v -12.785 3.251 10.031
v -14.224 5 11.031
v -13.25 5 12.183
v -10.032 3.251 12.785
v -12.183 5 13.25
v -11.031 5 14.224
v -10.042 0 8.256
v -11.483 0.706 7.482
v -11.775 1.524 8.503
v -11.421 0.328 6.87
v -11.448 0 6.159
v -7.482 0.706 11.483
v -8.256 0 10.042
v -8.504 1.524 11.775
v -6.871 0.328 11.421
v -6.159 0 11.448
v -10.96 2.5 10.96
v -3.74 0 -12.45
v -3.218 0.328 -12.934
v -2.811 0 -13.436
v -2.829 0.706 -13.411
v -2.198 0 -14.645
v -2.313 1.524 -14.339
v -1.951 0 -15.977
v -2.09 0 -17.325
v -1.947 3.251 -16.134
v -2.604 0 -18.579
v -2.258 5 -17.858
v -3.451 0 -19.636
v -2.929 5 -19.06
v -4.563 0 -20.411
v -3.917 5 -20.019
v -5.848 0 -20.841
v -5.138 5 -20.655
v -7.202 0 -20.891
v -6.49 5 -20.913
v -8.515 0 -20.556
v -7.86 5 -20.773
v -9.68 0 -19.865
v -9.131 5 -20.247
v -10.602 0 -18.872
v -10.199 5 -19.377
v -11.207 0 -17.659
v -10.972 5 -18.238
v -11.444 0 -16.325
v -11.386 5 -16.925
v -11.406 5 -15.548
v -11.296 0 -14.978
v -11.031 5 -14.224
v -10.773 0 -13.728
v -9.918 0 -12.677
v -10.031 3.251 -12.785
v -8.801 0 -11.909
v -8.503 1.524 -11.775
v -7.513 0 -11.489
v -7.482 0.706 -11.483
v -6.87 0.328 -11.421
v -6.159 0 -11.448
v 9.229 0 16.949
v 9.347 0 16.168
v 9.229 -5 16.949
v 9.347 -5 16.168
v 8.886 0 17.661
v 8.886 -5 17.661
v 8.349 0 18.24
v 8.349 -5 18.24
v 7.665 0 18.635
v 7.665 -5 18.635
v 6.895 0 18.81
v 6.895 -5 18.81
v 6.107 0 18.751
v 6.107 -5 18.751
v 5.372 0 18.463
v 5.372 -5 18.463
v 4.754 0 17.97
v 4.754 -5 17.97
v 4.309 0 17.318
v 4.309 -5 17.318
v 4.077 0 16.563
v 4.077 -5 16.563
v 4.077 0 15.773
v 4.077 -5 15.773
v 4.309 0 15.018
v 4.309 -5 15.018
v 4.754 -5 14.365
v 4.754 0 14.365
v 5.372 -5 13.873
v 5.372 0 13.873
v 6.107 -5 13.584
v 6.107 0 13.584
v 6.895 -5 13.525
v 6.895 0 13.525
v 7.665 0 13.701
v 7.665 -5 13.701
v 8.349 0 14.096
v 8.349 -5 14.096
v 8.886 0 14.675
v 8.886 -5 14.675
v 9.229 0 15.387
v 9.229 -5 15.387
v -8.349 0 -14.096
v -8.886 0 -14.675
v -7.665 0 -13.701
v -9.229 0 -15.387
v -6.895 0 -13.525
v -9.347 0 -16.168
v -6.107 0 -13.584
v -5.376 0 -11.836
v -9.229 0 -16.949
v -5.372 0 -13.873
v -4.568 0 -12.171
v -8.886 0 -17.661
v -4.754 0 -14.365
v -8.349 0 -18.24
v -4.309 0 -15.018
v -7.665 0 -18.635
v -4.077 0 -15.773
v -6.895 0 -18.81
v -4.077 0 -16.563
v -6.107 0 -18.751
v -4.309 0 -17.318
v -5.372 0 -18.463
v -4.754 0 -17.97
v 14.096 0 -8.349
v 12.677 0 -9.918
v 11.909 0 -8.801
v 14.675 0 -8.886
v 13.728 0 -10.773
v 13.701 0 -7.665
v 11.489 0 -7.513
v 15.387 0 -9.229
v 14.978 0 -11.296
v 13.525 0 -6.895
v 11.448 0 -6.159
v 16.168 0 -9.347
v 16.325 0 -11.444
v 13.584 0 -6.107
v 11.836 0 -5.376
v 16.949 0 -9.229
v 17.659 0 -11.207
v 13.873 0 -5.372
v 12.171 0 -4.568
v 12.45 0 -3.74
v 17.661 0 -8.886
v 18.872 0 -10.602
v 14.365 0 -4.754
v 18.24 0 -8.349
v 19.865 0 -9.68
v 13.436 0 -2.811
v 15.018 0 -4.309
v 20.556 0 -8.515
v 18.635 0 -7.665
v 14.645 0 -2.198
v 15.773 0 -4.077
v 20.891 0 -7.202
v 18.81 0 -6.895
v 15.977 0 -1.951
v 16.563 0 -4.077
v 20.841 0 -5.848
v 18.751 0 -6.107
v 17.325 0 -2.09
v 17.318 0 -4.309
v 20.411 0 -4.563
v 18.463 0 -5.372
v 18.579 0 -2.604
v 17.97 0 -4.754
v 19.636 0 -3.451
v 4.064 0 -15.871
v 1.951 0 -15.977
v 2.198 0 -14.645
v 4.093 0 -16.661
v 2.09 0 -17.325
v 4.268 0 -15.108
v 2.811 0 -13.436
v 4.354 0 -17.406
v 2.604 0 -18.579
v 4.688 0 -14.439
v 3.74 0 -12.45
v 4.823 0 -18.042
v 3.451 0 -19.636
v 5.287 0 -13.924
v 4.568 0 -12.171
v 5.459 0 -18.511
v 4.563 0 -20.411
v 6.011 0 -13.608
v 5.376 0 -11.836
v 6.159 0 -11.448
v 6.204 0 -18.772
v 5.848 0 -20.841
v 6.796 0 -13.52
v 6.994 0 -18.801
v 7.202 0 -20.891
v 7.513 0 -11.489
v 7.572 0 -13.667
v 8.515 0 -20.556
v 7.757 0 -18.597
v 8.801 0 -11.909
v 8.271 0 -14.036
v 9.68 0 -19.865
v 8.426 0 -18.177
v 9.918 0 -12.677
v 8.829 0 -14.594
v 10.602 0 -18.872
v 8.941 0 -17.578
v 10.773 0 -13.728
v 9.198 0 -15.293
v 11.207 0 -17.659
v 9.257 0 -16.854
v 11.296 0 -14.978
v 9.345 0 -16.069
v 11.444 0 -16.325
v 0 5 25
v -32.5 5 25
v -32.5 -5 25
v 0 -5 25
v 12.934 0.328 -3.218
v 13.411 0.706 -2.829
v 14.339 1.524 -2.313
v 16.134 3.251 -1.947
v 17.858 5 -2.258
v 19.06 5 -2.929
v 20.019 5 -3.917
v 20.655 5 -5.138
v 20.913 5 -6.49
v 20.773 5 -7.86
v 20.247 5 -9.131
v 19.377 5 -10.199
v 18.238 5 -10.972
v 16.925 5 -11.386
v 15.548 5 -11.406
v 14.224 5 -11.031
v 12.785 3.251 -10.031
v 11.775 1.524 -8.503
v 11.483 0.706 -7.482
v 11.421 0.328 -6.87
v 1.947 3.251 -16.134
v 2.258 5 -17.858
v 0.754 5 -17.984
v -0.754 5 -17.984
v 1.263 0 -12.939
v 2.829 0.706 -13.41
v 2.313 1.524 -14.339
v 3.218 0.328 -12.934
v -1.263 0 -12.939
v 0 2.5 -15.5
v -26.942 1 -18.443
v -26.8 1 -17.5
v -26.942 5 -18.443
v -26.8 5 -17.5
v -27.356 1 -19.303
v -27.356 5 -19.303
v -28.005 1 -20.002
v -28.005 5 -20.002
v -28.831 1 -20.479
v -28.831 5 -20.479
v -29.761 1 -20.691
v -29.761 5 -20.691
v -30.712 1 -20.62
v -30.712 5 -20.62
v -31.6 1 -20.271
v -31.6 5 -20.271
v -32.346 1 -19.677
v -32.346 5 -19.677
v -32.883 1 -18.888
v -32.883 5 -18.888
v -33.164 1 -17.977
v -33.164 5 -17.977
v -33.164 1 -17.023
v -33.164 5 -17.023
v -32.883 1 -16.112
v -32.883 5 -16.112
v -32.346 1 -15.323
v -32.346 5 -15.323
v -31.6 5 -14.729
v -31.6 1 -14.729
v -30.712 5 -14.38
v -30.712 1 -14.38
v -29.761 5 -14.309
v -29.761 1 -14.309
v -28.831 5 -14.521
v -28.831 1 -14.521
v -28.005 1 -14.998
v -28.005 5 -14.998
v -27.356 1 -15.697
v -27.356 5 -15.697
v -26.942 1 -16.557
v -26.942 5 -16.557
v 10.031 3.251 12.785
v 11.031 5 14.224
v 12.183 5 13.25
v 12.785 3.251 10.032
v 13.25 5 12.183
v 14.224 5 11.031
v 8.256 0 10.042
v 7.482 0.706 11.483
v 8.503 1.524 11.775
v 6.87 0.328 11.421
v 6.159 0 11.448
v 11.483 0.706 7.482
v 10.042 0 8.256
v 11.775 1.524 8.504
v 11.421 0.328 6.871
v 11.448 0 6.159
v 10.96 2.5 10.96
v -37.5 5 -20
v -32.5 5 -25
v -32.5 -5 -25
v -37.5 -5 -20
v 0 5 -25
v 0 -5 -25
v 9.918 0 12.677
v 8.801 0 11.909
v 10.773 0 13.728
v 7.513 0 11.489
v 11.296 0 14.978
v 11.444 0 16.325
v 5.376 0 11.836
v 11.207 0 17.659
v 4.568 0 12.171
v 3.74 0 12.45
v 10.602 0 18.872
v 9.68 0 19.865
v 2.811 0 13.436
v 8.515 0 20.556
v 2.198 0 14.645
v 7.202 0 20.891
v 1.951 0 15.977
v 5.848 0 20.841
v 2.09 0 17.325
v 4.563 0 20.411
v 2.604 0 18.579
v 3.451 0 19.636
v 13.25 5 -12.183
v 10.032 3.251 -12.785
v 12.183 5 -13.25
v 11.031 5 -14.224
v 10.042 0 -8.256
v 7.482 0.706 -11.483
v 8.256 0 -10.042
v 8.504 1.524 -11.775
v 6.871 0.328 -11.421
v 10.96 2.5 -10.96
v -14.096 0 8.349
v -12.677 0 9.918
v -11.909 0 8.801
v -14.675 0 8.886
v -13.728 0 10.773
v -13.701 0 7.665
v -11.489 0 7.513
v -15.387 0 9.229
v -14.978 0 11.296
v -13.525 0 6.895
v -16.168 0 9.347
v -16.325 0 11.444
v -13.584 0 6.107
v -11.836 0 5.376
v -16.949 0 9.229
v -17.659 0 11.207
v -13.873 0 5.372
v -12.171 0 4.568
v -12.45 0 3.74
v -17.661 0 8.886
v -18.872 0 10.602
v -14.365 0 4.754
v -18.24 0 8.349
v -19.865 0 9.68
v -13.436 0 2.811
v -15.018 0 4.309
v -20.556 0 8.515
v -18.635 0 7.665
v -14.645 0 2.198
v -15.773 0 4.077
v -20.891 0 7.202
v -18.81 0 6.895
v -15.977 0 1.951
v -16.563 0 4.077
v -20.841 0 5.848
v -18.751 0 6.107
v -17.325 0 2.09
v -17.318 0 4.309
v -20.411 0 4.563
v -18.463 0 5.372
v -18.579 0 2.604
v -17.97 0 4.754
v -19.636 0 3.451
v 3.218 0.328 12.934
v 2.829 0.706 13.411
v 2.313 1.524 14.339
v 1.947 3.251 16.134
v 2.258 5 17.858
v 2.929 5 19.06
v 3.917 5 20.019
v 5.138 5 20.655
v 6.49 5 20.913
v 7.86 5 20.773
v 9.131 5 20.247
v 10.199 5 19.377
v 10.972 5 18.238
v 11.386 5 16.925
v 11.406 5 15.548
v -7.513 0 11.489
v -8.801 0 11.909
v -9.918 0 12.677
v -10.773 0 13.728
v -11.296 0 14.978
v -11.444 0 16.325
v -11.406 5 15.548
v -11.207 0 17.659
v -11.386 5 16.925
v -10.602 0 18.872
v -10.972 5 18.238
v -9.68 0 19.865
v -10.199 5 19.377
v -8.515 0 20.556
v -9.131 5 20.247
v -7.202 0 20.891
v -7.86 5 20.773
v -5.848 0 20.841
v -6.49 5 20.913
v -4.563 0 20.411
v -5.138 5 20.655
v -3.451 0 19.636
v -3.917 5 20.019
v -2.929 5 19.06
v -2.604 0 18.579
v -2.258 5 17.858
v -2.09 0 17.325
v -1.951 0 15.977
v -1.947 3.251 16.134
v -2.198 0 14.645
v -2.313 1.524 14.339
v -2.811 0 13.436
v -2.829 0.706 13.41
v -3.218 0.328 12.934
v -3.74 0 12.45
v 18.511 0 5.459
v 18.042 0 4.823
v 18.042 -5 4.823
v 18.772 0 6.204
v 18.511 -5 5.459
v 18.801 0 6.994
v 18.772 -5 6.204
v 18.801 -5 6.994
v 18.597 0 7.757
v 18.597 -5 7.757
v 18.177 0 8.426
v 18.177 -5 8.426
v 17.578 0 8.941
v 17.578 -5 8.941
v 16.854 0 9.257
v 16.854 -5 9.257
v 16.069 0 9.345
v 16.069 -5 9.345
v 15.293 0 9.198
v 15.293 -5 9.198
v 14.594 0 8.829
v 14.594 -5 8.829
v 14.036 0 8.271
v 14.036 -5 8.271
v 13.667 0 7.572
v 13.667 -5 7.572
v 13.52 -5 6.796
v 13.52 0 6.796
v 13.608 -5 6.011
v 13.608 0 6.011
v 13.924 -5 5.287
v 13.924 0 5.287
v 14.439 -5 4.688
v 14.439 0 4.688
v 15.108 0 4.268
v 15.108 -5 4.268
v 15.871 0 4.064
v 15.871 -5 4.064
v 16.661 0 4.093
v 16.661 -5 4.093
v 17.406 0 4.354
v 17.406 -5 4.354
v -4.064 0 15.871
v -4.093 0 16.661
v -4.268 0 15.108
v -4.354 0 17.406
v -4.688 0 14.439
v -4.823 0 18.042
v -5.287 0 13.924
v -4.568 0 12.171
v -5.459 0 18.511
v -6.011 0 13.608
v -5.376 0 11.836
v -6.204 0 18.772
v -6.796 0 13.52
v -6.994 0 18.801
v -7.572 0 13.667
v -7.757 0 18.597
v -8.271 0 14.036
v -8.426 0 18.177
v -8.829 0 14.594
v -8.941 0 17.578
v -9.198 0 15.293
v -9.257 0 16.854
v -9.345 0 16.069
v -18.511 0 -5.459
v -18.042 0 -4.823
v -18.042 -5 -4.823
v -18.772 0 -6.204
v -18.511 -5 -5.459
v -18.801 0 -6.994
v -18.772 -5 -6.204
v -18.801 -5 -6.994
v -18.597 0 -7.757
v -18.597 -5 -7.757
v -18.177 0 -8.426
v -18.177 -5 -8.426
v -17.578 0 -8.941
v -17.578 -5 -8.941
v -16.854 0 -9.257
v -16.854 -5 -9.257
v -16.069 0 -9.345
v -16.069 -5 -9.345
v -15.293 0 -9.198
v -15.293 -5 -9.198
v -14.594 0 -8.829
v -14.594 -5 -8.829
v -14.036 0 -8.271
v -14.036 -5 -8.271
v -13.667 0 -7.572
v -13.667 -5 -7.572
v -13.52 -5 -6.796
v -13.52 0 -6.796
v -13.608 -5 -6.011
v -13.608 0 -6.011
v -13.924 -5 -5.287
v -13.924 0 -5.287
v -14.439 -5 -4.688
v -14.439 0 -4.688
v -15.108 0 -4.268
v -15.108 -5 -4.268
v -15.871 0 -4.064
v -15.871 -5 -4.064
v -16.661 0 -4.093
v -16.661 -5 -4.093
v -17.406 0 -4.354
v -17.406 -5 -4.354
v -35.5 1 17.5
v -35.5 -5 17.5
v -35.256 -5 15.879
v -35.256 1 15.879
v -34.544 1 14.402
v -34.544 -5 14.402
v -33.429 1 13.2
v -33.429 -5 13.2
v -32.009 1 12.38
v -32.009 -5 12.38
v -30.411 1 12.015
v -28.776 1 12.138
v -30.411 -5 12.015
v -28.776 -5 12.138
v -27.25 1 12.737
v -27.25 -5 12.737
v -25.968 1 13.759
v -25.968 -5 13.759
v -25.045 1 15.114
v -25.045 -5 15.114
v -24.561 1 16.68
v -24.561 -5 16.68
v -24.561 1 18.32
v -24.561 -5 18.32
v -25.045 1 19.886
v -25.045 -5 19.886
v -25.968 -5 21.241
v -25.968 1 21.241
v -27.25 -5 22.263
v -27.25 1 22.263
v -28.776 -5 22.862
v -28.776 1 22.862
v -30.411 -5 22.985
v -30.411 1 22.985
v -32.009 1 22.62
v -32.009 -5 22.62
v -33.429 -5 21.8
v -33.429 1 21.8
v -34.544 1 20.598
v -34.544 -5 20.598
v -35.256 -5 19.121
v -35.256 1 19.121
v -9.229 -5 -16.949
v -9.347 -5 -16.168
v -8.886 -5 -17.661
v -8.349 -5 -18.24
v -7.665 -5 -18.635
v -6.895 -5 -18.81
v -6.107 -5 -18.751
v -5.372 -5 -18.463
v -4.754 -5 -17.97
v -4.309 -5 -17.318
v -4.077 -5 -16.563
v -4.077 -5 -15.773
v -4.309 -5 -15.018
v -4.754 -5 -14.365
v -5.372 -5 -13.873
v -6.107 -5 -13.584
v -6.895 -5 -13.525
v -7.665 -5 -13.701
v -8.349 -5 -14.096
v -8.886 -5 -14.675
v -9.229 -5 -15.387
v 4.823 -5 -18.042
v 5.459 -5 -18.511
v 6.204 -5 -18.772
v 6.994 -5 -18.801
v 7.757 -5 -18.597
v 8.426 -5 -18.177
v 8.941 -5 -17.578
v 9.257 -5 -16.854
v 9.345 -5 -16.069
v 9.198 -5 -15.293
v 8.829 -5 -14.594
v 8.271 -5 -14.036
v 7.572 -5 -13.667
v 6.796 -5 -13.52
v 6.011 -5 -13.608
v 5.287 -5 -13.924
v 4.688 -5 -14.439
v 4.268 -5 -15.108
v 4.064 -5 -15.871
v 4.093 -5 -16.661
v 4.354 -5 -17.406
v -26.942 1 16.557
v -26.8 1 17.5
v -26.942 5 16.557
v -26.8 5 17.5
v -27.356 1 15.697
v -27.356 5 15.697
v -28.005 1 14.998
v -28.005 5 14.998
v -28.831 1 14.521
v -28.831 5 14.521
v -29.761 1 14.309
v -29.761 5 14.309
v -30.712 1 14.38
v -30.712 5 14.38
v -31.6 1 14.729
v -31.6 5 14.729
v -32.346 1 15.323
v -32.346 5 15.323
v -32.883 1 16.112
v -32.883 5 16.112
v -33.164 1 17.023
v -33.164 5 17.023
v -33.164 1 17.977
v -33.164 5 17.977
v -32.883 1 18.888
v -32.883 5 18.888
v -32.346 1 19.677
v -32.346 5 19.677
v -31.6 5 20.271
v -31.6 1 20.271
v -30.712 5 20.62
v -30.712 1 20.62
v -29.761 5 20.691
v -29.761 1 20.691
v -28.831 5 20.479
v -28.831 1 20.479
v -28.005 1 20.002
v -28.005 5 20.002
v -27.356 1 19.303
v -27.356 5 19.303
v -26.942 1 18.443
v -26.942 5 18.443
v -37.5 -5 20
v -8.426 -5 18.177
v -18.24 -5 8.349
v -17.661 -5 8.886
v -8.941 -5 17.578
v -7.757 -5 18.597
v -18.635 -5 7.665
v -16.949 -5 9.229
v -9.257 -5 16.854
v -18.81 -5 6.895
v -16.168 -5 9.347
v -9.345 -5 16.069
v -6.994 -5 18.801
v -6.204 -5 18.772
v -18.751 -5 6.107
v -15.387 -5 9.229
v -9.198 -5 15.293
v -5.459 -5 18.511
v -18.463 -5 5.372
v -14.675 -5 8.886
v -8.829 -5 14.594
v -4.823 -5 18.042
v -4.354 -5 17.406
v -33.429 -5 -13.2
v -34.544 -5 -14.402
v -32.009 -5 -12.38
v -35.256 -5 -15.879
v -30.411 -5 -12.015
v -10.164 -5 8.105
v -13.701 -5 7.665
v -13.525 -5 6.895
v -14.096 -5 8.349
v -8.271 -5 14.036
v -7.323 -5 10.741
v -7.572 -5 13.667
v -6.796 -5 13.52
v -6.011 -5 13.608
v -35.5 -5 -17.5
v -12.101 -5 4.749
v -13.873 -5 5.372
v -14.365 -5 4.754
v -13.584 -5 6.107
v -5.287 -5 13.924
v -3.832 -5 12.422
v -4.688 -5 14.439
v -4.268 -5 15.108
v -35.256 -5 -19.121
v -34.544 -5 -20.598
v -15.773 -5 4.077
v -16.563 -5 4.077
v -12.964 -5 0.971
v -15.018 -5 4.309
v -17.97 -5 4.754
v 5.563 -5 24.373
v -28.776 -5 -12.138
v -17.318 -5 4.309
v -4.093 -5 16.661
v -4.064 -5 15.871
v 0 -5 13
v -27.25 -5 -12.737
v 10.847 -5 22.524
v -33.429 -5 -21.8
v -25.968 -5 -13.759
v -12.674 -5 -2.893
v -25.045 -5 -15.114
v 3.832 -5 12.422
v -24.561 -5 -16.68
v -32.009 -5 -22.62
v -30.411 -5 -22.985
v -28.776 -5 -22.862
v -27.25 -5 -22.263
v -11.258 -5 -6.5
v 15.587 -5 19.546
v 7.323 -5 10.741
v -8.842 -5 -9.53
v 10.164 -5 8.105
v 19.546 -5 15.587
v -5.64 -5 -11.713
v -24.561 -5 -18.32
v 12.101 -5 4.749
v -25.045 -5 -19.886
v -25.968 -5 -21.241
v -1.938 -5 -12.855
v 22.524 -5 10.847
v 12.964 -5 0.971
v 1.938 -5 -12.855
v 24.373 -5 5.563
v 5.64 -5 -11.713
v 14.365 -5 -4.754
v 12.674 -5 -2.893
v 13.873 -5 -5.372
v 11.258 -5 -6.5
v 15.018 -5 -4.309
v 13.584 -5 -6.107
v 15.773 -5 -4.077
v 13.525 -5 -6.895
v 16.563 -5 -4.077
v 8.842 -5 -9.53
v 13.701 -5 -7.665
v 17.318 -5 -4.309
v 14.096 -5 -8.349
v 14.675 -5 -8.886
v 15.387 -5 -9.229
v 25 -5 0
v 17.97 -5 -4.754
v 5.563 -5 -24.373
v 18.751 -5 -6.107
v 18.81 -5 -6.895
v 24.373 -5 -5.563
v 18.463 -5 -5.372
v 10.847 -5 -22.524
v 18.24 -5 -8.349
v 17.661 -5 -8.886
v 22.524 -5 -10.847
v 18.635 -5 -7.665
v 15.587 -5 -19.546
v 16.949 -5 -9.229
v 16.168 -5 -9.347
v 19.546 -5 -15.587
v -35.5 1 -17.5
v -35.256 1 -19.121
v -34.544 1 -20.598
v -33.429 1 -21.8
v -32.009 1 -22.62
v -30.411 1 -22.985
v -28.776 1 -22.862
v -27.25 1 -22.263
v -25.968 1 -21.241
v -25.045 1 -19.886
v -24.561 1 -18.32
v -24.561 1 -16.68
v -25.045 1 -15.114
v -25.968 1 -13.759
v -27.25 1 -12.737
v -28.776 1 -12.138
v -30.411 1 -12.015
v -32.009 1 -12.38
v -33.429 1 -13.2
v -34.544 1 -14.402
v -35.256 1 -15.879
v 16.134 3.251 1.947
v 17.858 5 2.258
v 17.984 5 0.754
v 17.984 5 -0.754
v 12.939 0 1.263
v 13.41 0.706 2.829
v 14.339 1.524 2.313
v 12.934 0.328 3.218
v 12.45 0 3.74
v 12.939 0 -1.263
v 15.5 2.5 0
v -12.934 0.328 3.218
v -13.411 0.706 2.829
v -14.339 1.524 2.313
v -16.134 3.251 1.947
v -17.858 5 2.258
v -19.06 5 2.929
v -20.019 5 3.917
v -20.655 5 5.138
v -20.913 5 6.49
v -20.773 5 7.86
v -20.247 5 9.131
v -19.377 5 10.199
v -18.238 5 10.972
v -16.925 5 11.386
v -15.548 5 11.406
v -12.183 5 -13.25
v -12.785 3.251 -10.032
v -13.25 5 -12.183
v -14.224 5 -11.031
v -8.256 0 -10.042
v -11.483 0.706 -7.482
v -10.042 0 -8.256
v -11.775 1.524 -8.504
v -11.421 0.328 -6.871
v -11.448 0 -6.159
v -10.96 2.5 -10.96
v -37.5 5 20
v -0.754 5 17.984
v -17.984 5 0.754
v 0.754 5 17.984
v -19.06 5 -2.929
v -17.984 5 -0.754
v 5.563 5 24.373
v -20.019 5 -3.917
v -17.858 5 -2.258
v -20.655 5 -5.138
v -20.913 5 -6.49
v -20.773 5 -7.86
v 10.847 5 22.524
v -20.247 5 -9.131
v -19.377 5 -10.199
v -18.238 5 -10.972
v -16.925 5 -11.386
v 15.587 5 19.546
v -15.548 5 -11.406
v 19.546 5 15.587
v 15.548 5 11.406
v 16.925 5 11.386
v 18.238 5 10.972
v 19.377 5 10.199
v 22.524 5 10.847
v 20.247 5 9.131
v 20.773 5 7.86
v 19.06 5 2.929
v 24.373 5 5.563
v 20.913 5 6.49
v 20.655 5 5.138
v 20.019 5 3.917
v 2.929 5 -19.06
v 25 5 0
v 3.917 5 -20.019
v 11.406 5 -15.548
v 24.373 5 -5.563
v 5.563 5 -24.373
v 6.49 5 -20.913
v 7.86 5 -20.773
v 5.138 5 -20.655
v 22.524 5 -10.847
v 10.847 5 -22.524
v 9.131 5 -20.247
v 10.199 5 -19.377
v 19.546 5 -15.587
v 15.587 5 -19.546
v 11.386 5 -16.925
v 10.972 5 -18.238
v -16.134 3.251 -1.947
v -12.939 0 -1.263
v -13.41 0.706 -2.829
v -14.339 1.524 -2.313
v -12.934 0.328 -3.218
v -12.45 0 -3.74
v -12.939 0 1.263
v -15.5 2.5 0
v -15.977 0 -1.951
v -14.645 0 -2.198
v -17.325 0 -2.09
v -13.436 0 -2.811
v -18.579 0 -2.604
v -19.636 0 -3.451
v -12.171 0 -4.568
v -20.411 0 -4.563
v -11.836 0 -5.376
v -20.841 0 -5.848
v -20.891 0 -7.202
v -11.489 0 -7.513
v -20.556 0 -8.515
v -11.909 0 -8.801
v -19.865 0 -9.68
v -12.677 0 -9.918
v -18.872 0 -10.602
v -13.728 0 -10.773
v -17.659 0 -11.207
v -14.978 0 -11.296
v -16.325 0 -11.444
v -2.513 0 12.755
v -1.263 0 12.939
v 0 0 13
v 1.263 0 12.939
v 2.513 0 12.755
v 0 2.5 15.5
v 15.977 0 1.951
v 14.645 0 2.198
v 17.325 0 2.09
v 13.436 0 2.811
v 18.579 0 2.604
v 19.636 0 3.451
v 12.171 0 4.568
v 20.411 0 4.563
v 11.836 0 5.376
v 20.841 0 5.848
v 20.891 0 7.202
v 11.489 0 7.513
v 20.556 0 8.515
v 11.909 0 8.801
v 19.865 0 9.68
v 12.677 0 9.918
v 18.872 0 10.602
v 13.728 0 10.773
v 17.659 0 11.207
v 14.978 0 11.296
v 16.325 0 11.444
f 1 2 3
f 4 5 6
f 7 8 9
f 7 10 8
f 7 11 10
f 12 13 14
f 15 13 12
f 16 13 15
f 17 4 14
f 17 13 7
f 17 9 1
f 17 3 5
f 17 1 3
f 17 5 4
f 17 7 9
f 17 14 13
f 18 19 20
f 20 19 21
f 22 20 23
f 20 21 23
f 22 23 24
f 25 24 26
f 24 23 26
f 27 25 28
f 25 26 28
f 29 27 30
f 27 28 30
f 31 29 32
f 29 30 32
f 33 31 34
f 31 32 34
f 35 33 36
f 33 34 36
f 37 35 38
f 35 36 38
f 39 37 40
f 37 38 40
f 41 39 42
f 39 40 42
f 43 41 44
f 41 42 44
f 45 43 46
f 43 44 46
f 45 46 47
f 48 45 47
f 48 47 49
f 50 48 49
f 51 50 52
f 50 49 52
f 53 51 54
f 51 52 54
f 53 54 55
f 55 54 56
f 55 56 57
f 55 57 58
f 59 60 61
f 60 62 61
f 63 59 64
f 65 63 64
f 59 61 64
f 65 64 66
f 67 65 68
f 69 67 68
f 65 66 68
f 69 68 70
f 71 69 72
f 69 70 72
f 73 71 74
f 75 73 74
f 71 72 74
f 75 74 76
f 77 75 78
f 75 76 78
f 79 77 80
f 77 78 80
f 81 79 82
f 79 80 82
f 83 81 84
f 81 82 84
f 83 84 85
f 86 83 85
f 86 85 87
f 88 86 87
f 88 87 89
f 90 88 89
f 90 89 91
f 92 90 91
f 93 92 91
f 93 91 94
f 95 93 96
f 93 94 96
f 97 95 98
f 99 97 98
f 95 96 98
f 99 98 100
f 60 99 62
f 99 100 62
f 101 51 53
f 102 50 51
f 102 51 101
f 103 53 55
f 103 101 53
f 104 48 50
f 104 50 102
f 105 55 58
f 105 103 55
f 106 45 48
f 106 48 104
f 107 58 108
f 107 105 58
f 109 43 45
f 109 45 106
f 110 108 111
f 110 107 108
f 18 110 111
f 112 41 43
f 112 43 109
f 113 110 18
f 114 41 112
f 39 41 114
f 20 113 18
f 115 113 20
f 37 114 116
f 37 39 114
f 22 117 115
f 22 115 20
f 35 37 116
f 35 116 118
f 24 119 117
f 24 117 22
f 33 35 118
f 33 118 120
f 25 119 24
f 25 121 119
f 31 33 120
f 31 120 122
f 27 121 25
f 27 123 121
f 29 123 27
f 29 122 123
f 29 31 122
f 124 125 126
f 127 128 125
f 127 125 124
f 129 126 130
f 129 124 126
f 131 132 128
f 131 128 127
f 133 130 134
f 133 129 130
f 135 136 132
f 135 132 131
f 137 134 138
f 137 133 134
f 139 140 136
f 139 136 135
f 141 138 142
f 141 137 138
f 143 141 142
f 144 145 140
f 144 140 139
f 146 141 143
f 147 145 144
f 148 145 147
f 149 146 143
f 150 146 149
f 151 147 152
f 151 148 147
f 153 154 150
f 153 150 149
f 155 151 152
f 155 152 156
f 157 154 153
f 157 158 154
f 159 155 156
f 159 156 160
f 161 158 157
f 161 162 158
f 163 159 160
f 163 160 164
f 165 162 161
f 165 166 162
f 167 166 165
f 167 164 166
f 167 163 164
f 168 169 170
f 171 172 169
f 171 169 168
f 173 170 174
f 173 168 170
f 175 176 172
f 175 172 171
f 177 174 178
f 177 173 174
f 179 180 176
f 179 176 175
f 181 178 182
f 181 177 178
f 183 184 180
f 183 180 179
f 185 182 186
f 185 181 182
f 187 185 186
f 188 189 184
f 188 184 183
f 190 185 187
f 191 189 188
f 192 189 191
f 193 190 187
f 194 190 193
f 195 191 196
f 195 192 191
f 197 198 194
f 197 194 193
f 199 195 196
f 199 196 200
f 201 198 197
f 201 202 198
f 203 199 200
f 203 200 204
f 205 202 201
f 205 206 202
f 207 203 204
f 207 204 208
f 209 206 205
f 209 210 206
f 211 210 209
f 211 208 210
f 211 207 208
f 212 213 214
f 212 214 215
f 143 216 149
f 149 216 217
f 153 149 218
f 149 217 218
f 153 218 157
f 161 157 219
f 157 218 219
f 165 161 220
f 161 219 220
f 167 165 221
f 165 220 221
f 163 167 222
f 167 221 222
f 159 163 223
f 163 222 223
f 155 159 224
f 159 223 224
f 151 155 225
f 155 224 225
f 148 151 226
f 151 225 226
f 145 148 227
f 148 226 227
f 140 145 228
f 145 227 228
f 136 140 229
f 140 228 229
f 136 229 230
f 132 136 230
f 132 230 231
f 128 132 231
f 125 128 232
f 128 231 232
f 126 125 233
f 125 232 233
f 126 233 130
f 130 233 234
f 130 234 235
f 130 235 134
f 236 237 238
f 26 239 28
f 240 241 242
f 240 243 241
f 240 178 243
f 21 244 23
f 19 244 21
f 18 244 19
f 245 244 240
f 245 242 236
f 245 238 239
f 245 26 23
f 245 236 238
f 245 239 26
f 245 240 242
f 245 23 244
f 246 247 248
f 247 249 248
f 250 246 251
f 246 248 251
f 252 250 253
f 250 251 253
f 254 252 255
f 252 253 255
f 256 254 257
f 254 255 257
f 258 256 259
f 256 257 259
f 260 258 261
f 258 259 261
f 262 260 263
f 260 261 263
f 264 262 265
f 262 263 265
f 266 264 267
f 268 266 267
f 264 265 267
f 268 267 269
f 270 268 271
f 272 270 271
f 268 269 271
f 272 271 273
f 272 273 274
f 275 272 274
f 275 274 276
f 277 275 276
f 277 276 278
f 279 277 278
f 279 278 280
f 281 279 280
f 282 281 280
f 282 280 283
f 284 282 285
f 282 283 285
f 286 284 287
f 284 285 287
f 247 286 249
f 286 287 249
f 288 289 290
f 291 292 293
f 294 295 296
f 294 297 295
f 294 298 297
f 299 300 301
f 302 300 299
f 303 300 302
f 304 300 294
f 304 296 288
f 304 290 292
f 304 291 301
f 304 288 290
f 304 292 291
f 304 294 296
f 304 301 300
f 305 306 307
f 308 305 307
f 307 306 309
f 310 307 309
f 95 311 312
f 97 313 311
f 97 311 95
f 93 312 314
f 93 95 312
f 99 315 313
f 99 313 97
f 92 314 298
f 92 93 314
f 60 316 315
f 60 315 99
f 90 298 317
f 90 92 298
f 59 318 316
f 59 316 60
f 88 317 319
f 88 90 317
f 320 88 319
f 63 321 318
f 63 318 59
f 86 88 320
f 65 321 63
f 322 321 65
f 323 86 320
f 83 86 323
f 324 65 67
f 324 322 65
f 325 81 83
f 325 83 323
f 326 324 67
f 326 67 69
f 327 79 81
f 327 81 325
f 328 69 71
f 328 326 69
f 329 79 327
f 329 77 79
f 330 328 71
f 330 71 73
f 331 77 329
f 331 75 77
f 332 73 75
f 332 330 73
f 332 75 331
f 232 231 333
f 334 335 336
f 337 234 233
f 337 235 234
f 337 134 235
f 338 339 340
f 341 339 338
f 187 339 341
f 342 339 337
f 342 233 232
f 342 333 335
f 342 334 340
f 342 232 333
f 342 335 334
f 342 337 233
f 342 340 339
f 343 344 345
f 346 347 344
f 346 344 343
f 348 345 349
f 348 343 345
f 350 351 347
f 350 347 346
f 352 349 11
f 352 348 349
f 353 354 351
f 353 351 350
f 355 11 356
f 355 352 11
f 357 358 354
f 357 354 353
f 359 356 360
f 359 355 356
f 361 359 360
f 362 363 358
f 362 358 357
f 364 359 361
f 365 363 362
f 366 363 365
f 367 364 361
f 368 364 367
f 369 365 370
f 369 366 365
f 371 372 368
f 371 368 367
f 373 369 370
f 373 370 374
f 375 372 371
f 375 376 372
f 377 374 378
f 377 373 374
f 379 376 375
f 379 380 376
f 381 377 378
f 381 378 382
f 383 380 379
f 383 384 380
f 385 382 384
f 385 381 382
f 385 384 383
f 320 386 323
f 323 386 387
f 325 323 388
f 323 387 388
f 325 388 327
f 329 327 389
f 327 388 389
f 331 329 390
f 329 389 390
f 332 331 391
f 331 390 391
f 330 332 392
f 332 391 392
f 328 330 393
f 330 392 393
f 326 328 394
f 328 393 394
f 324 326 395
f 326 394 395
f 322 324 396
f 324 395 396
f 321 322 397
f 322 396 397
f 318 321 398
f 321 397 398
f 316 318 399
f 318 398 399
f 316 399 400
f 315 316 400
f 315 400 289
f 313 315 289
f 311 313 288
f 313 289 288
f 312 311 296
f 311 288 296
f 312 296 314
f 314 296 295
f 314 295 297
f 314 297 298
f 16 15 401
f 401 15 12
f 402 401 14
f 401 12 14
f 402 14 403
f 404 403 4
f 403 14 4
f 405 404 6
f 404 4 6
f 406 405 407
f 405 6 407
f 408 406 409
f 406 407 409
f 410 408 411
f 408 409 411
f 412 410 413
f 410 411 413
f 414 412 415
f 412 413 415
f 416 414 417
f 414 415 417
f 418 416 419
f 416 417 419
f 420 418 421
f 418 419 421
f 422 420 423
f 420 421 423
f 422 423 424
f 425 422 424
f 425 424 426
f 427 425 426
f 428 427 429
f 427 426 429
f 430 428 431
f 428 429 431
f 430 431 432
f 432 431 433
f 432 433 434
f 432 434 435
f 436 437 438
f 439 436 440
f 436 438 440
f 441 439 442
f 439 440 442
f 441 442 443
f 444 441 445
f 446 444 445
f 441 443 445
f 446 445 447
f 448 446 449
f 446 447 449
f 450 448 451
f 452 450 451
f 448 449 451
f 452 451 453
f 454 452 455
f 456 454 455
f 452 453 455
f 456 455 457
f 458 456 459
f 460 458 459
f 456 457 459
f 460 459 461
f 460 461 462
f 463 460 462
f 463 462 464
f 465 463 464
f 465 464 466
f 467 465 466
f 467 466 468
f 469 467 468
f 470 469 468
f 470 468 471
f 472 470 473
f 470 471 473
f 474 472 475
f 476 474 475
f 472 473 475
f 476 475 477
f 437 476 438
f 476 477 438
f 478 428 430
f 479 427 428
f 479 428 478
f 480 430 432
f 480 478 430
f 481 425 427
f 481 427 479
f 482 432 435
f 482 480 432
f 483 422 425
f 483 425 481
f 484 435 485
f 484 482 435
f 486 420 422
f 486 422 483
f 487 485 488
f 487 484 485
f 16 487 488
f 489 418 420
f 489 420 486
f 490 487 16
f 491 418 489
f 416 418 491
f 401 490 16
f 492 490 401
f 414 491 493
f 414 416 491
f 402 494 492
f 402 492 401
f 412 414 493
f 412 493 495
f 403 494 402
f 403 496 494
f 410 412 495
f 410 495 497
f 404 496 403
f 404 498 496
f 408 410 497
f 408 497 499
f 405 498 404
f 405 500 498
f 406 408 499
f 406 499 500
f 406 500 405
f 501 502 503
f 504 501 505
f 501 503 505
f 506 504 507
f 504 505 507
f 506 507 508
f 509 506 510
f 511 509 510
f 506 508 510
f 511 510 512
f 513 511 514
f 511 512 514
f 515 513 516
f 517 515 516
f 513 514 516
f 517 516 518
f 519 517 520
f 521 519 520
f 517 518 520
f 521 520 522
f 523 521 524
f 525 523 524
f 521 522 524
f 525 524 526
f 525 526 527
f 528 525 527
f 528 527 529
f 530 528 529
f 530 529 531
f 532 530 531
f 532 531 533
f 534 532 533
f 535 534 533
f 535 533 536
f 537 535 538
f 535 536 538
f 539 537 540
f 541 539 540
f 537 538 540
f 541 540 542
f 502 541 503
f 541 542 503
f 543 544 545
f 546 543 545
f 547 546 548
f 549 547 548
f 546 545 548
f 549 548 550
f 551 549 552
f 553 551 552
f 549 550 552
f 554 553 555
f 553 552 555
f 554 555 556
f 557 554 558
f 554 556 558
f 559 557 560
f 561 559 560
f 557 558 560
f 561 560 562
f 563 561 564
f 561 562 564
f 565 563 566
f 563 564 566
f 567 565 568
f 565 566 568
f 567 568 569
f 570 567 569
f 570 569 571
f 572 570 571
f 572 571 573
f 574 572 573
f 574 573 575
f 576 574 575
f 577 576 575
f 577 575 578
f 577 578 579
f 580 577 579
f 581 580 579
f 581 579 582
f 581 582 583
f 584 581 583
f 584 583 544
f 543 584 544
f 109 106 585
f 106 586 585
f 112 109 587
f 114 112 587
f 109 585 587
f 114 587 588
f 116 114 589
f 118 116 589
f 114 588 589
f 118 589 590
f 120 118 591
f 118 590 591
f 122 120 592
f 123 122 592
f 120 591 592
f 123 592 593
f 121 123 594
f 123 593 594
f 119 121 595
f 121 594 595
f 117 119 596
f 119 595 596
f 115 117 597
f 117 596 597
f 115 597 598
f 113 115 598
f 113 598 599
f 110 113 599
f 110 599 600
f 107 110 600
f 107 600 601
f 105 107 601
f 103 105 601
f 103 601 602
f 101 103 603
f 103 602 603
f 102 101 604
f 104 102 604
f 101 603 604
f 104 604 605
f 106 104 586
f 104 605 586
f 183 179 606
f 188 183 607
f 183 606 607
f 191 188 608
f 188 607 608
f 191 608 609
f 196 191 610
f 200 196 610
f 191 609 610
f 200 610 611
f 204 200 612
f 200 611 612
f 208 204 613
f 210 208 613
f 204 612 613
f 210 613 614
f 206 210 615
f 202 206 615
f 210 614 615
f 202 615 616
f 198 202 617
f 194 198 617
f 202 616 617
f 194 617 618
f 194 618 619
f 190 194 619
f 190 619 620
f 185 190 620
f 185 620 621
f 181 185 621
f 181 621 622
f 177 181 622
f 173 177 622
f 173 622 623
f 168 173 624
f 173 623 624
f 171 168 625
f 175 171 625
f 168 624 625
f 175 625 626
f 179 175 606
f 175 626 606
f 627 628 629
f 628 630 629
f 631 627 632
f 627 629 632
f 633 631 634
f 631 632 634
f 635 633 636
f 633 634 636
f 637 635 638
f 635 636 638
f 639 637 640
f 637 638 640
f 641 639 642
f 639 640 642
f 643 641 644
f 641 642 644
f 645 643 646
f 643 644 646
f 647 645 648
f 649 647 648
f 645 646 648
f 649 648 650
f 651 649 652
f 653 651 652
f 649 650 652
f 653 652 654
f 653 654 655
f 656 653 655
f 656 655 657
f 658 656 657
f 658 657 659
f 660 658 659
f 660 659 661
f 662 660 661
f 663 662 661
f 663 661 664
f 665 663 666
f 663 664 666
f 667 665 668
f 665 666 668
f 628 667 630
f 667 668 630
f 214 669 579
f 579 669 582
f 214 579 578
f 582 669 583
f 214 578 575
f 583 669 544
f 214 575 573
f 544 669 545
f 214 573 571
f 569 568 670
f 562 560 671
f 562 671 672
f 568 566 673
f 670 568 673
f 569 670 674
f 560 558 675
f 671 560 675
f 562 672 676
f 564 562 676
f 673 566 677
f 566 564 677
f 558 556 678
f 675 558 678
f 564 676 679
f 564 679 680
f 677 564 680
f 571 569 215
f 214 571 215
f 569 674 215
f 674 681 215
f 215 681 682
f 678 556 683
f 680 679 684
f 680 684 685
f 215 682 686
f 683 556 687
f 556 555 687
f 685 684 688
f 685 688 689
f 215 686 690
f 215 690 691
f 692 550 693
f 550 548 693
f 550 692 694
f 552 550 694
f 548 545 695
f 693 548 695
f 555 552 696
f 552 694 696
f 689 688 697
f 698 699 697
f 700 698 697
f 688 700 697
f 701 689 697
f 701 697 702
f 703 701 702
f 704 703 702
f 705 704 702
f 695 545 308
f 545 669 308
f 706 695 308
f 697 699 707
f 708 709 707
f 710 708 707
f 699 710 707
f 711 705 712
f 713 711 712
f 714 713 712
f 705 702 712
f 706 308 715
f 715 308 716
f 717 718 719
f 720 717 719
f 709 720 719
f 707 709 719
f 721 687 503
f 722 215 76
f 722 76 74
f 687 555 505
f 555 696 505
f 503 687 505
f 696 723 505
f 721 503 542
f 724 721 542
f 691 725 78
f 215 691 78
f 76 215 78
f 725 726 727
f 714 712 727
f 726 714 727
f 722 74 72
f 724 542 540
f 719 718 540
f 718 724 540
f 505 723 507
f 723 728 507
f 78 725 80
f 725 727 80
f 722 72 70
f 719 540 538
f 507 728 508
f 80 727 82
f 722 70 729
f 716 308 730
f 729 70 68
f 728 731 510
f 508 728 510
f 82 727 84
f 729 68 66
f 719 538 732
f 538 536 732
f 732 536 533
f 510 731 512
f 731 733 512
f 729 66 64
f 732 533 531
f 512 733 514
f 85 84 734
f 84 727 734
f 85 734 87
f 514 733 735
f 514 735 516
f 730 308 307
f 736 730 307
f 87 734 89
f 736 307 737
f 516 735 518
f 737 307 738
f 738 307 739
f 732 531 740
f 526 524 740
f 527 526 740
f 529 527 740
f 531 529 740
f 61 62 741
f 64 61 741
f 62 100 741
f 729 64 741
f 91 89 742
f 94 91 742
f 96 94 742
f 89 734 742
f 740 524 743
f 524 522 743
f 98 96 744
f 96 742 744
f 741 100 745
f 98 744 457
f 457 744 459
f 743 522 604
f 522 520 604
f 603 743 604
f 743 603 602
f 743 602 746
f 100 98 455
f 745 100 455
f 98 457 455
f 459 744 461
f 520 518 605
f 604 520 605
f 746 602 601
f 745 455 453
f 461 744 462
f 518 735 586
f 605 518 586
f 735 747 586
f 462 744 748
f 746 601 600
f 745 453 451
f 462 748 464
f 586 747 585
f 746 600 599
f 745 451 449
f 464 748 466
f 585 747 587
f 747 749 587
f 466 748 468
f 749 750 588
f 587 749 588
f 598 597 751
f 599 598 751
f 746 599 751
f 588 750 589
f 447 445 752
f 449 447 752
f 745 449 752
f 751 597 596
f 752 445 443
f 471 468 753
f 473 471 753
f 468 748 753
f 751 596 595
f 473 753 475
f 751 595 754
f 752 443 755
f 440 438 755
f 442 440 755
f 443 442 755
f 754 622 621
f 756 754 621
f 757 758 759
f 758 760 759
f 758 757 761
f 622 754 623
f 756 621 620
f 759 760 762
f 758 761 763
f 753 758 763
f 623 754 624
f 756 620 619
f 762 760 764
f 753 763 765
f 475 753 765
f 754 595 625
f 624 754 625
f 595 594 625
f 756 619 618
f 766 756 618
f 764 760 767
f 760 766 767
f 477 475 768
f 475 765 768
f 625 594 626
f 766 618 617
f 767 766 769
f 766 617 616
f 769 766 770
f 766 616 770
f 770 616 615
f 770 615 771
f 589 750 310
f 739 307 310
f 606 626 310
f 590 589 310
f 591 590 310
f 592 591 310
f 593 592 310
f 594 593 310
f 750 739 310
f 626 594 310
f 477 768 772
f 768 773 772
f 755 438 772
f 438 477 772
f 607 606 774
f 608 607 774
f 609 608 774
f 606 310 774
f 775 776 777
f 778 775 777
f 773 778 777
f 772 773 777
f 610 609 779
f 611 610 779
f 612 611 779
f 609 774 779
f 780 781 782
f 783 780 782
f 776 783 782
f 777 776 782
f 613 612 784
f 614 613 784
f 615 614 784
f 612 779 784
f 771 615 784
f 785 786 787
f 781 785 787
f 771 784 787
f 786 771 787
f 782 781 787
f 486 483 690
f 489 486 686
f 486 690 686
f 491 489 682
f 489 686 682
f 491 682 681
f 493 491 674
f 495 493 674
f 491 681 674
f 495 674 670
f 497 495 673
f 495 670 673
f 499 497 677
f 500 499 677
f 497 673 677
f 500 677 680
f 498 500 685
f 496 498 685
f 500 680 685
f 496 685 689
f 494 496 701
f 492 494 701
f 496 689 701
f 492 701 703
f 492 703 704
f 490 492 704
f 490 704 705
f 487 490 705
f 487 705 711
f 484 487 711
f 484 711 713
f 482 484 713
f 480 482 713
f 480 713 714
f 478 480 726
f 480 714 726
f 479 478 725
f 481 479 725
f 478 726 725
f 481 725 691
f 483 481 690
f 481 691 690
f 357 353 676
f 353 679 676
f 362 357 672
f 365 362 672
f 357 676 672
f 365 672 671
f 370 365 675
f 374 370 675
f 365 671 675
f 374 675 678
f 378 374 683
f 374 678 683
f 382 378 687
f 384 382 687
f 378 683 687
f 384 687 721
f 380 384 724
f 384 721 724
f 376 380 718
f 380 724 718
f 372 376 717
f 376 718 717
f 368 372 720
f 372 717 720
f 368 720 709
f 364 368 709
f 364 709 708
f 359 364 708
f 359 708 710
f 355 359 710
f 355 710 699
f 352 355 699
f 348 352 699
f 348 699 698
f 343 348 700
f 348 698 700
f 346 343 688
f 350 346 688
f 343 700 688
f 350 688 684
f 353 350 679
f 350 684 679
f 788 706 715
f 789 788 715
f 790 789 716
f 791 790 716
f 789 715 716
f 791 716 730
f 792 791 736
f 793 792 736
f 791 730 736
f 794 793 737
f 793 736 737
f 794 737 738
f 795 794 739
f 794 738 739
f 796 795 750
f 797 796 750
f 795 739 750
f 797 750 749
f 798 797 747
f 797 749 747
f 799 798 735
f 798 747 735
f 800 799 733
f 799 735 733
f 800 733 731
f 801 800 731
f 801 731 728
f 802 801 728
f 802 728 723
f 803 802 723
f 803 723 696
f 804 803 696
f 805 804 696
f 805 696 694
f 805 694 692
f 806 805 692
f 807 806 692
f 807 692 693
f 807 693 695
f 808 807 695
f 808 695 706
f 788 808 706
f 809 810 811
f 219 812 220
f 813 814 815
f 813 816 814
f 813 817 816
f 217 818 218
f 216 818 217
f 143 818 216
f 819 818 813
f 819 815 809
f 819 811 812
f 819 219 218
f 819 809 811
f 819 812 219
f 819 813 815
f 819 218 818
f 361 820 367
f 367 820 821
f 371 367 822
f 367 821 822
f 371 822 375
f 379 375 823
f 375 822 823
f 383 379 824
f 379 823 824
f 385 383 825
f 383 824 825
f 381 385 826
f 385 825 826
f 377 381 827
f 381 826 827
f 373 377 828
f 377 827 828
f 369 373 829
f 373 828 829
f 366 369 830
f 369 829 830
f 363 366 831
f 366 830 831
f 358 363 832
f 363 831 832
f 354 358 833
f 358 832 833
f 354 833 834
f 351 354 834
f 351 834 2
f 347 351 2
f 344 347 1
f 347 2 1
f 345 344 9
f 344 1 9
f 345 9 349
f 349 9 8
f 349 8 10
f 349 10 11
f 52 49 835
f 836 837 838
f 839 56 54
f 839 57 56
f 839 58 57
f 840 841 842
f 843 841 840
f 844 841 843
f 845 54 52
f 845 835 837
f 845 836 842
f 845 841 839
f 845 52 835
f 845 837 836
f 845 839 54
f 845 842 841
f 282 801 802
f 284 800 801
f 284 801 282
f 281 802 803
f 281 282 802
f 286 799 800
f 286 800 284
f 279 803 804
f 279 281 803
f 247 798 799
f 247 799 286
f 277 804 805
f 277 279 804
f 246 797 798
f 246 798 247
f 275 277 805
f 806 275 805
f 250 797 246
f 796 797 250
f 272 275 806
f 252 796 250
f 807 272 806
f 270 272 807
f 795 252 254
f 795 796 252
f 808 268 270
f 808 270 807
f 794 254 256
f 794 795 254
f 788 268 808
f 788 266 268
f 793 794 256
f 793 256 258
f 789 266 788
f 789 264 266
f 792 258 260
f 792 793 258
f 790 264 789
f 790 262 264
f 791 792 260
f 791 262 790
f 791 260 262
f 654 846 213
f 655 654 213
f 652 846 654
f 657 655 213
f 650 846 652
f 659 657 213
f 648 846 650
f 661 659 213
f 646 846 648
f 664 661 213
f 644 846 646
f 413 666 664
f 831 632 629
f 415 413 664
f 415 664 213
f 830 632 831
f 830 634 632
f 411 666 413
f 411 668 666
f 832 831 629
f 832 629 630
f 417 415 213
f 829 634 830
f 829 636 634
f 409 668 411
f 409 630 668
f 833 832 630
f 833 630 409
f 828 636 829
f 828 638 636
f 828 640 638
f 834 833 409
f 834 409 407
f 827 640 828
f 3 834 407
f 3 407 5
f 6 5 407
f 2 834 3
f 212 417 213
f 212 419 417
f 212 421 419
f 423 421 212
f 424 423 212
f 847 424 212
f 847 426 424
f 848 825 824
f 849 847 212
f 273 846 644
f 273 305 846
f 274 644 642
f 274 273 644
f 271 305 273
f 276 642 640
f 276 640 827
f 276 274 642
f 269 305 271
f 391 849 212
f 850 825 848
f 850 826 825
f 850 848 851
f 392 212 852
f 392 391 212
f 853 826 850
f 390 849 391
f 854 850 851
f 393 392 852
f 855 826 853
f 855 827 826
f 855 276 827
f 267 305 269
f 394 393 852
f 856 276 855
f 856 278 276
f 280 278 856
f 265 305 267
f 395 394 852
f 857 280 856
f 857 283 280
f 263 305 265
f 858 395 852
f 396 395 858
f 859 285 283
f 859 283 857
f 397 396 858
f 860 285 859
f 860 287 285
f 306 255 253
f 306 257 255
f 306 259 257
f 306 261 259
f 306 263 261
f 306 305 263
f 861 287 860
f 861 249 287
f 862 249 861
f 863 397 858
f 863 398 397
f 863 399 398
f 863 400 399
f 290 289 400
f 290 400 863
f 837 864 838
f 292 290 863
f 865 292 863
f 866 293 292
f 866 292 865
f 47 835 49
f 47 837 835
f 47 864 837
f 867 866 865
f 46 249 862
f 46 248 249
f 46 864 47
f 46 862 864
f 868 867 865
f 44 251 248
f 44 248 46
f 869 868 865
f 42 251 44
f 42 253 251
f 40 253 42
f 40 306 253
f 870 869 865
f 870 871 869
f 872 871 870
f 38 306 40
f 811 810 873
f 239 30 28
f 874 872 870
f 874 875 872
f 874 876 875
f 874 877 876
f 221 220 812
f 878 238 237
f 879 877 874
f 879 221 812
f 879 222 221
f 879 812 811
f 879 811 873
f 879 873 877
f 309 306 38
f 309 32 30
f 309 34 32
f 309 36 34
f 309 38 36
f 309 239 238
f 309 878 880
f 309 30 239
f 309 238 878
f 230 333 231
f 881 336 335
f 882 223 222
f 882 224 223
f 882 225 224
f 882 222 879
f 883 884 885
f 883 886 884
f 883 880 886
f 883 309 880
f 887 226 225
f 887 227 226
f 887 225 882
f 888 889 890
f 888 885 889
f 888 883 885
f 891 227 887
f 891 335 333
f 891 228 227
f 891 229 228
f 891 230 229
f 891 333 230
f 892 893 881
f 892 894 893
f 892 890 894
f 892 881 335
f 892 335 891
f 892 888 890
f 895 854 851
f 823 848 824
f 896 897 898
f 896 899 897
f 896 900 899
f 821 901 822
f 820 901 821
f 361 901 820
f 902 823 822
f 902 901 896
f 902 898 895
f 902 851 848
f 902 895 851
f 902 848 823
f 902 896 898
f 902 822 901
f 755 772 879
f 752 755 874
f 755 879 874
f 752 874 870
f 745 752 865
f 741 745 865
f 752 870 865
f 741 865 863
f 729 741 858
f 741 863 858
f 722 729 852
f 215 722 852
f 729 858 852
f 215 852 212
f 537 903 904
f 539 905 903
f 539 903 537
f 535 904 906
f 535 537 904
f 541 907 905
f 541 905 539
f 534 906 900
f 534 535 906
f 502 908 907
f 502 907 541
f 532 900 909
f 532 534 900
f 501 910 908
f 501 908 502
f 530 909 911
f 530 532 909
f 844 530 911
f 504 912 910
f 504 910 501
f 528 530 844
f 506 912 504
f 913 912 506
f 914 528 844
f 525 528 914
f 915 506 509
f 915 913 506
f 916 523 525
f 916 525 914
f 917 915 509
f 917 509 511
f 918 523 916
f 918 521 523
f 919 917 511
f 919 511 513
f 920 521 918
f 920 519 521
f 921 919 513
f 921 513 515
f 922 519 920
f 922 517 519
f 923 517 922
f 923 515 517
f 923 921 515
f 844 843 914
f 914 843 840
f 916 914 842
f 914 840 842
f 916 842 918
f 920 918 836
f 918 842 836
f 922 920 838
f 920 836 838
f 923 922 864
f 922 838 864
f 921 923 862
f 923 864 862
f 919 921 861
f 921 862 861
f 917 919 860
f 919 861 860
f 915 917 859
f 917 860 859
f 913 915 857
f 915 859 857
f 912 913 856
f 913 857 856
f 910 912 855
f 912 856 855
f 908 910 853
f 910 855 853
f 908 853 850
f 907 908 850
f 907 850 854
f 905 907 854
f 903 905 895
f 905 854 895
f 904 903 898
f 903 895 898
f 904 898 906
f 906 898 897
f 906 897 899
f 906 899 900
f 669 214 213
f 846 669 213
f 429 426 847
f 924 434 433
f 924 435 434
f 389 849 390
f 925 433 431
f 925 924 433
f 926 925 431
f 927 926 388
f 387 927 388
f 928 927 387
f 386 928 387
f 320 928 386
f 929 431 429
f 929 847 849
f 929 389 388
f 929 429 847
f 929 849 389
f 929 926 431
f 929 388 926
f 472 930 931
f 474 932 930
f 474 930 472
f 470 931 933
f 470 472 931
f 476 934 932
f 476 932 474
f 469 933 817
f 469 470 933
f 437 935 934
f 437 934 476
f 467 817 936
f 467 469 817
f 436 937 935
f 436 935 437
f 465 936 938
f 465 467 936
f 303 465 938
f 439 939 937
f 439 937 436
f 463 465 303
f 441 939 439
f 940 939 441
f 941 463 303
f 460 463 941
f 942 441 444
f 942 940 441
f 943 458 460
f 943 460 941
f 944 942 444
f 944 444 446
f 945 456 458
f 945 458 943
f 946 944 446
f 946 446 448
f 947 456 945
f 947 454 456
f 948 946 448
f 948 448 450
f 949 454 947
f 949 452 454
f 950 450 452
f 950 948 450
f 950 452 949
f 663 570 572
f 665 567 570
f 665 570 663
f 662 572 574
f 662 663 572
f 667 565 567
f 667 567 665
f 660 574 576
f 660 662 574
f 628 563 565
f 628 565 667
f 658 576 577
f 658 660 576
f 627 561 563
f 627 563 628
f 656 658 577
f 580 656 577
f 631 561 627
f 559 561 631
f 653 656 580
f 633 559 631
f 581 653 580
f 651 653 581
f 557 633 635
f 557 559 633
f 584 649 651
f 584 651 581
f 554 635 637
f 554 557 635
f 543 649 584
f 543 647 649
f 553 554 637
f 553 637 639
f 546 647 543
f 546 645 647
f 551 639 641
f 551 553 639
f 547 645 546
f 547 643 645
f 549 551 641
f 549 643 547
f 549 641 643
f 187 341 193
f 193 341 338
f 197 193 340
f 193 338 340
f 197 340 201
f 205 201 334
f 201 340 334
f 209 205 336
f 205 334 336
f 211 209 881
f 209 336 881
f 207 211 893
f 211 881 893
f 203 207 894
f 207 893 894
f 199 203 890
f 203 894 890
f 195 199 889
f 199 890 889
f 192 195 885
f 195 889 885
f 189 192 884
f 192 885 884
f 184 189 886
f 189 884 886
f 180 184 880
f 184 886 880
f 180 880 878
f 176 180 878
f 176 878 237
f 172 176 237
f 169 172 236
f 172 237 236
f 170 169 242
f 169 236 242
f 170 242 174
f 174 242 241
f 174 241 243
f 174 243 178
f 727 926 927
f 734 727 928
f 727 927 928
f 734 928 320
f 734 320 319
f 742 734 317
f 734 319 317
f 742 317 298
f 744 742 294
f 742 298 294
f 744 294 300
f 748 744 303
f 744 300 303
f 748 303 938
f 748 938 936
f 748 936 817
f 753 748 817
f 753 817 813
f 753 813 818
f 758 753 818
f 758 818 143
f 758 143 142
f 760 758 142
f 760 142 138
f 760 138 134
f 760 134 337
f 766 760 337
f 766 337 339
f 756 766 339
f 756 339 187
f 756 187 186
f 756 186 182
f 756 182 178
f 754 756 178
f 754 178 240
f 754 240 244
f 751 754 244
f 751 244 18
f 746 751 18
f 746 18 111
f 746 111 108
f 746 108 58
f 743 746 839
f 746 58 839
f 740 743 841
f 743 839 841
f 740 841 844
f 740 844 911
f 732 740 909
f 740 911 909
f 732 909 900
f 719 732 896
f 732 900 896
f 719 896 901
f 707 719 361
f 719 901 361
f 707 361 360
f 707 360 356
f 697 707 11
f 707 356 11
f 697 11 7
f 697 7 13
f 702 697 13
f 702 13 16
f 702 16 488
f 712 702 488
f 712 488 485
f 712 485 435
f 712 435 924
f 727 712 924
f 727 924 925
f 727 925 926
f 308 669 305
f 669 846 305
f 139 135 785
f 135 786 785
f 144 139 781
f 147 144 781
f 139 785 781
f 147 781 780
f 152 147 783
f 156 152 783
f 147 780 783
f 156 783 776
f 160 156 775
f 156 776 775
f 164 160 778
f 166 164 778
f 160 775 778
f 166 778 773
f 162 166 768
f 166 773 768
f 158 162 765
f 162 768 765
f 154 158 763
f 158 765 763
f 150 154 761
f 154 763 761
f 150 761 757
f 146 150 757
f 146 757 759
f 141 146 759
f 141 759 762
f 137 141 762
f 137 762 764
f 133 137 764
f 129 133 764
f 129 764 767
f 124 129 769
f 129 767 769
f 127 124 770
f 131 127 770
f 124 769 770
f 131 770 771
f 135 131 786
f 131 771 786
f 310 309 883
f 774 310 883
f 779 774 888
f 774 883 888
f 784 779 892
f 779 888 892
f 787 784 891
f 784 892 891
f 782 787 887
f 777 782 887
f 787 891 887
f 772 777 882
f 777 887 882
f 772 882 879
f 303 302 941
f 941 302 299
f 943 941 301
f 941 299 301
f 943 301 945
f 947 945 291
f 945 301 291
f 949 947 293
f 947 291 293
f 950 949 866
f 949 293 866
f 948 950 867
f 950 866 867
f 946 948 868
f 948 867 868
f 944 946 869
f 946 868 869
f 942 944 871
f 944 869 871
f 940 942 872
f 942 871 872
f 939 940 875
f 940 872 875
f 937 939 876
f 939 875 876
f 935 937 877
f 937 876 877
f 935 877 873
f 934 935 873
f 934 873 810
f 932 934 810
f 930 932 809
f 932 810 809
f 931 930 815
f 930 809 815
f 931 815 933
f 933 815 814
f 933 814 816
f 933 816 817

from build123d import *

# Parameters (mm, degrees)
SKETCH1_W                      = 75
SKETCH1_H                      = 50
BOSS_EXTRUDE1_DEPTH            = 5
CUT_EXTRUDE1_REACH             = 48.165
SKETCH2_R                      = 13
CHAMFER1_SIZE                  = 5
CBORE_FOR_M5_SHCS1_D           = 5.3
CBORE_FOR_M5_SHCS1_CBORE_D     = 9.5
CBORE_FOR_M5_SHCS1_CBORE_DEPTH = 5
CIRPATTERN1_COUNT              = 8
CBORE_FOR_M6_SHCS1_D           = 6.4
CBORE_FOR_M6_SHCS1_CBORE_D     = 11
CBORE_FOR_M6_SHCS1_CBORE_DEPTH = 6
CHAMFER2_SIZE                  = 5
CUT_EXTRUDE2_DEPTH             = 10


with BuildPart() as part:
    # Sketch1 → Boss-Extrude1 (new, symmetric)
    with BuildSketch(Plane(origin=(0, 0, 0), x_dir=(1, 0, 0), z_dir=(0, 1, 0))):
        Rectangle(SKETCH1_W, SKETCH1_H)
    extrude(amount=BOSS_EXTRUDE1_DEPTH, both=True)

    # Sketch2 → Cut-Extrude1 (cut, up to next)
    with BuildSketch(Plane(origin=(0, 5, 0), x_dir=(1, 0, 0), z_dir=(0, 1, 0)), mode=Mode.PRIVATE) as cut_extrude1_sk1:
        with Locations(Location((0, 0, 0), (0, 0, 270))):
            Circle(SKETCH2_R)
    cut_extrude1_tool1 = extrude(cut_extrude1_sk1.sketch, amount=-CUT_EXTRUDE1_REACH, mode=Mode.PRIVATE) & part.part
    add(cut_extrude1_tool1.solids().sort_by_distance((0, 5, 0))[0], mode=Mode.SUBTRACT)

    # Chamfer1
    chamfer1_edges = [part.edges().sort_by_distance(p)[0] for p in [
        (0, 5, -13),
    ]]
    chamfer(chamfer1_edges, length=CHAMFER1_SIZE)

    # CBORE for M5 SHCS1 (through all)
    with Locations(Plane(origin=(0, 5, 0), x_dir=(1, 0, 0), z_dir=(0, 1, 0))):
        with Locations((-6.696960066, 16.167891819)):
            cbore_for_m5_shcs1 = CounterBoreHole(CBORE_FOR_M5_SHCS1_D / 2, CBORE_FOR_M5_SHCS1_CBORE_D / 2, CBORE_FOR_M5_SHCS1_CBORE_DEPTH)

    # CirPattern1: CBORE for M5 SHCS1 ×8 about axis
    cirpattern1_axis = Axis((0, 0, 0), (0, 1, 0))
    for i in range(1, CIRPATTERN1_COUNT):
        add(cbore_for_m5_shcs1.rotate(cirpattern1_axis, i * 360 / CIRPATTERN1_COUNT), mode=Mode.SUBTRACT)

    # CBORE for M6 SHCS1 (through all)
    with Locations(Plane(origin=(0, -5, 0), x_dir=(-1, 0, 0), z_dir=(0, -1, 0))):
        with Locations((30, -17.5), (30, 17.5)):
            CounterBoreHole(CBORE_FOR_M6_SHCS1_D / 2, CBORE_FOR_M6_SHCS1_CBORE_D / 2, CBORE_FOR_M6_SHCS1_CBORE_DEPTH)

    # Chamfer2
    chamfer2_edges = [part.edges().sort_by_distance(p)[0] for p in [
        (-37.5, 0, 25),
        (-37.5, 0, -25),
    ]]
    chamfer(chamfer2_edges, length=CHAMFER2_SIZE)

    # Sketch10 → Cut-Extrude2 (cut)
    with BuildSketch(Plane(origin=(0, 5, 0), x_dir=(1, 0, 0), z_dir=(0, 1, 0))):
        with BuildLine():
            ThreePointArc((0, 25), (17.67766953, 17.67766953), (25, 0))
            ThreePointArc((25, 0), (17.677669539, -17.67766952), (2.6e-08, -25))
            Line((2.6e-08, -25), (37.5, -25))
            Line((37.5, -25), (37.5, 25))
            Line((37.5, 25), (0, 25))
        make_face()
    extrude(amount=-CUT_EXTRUDE2_DEPTH, mode=Mode.SUBTRACT)


solid = part.part
